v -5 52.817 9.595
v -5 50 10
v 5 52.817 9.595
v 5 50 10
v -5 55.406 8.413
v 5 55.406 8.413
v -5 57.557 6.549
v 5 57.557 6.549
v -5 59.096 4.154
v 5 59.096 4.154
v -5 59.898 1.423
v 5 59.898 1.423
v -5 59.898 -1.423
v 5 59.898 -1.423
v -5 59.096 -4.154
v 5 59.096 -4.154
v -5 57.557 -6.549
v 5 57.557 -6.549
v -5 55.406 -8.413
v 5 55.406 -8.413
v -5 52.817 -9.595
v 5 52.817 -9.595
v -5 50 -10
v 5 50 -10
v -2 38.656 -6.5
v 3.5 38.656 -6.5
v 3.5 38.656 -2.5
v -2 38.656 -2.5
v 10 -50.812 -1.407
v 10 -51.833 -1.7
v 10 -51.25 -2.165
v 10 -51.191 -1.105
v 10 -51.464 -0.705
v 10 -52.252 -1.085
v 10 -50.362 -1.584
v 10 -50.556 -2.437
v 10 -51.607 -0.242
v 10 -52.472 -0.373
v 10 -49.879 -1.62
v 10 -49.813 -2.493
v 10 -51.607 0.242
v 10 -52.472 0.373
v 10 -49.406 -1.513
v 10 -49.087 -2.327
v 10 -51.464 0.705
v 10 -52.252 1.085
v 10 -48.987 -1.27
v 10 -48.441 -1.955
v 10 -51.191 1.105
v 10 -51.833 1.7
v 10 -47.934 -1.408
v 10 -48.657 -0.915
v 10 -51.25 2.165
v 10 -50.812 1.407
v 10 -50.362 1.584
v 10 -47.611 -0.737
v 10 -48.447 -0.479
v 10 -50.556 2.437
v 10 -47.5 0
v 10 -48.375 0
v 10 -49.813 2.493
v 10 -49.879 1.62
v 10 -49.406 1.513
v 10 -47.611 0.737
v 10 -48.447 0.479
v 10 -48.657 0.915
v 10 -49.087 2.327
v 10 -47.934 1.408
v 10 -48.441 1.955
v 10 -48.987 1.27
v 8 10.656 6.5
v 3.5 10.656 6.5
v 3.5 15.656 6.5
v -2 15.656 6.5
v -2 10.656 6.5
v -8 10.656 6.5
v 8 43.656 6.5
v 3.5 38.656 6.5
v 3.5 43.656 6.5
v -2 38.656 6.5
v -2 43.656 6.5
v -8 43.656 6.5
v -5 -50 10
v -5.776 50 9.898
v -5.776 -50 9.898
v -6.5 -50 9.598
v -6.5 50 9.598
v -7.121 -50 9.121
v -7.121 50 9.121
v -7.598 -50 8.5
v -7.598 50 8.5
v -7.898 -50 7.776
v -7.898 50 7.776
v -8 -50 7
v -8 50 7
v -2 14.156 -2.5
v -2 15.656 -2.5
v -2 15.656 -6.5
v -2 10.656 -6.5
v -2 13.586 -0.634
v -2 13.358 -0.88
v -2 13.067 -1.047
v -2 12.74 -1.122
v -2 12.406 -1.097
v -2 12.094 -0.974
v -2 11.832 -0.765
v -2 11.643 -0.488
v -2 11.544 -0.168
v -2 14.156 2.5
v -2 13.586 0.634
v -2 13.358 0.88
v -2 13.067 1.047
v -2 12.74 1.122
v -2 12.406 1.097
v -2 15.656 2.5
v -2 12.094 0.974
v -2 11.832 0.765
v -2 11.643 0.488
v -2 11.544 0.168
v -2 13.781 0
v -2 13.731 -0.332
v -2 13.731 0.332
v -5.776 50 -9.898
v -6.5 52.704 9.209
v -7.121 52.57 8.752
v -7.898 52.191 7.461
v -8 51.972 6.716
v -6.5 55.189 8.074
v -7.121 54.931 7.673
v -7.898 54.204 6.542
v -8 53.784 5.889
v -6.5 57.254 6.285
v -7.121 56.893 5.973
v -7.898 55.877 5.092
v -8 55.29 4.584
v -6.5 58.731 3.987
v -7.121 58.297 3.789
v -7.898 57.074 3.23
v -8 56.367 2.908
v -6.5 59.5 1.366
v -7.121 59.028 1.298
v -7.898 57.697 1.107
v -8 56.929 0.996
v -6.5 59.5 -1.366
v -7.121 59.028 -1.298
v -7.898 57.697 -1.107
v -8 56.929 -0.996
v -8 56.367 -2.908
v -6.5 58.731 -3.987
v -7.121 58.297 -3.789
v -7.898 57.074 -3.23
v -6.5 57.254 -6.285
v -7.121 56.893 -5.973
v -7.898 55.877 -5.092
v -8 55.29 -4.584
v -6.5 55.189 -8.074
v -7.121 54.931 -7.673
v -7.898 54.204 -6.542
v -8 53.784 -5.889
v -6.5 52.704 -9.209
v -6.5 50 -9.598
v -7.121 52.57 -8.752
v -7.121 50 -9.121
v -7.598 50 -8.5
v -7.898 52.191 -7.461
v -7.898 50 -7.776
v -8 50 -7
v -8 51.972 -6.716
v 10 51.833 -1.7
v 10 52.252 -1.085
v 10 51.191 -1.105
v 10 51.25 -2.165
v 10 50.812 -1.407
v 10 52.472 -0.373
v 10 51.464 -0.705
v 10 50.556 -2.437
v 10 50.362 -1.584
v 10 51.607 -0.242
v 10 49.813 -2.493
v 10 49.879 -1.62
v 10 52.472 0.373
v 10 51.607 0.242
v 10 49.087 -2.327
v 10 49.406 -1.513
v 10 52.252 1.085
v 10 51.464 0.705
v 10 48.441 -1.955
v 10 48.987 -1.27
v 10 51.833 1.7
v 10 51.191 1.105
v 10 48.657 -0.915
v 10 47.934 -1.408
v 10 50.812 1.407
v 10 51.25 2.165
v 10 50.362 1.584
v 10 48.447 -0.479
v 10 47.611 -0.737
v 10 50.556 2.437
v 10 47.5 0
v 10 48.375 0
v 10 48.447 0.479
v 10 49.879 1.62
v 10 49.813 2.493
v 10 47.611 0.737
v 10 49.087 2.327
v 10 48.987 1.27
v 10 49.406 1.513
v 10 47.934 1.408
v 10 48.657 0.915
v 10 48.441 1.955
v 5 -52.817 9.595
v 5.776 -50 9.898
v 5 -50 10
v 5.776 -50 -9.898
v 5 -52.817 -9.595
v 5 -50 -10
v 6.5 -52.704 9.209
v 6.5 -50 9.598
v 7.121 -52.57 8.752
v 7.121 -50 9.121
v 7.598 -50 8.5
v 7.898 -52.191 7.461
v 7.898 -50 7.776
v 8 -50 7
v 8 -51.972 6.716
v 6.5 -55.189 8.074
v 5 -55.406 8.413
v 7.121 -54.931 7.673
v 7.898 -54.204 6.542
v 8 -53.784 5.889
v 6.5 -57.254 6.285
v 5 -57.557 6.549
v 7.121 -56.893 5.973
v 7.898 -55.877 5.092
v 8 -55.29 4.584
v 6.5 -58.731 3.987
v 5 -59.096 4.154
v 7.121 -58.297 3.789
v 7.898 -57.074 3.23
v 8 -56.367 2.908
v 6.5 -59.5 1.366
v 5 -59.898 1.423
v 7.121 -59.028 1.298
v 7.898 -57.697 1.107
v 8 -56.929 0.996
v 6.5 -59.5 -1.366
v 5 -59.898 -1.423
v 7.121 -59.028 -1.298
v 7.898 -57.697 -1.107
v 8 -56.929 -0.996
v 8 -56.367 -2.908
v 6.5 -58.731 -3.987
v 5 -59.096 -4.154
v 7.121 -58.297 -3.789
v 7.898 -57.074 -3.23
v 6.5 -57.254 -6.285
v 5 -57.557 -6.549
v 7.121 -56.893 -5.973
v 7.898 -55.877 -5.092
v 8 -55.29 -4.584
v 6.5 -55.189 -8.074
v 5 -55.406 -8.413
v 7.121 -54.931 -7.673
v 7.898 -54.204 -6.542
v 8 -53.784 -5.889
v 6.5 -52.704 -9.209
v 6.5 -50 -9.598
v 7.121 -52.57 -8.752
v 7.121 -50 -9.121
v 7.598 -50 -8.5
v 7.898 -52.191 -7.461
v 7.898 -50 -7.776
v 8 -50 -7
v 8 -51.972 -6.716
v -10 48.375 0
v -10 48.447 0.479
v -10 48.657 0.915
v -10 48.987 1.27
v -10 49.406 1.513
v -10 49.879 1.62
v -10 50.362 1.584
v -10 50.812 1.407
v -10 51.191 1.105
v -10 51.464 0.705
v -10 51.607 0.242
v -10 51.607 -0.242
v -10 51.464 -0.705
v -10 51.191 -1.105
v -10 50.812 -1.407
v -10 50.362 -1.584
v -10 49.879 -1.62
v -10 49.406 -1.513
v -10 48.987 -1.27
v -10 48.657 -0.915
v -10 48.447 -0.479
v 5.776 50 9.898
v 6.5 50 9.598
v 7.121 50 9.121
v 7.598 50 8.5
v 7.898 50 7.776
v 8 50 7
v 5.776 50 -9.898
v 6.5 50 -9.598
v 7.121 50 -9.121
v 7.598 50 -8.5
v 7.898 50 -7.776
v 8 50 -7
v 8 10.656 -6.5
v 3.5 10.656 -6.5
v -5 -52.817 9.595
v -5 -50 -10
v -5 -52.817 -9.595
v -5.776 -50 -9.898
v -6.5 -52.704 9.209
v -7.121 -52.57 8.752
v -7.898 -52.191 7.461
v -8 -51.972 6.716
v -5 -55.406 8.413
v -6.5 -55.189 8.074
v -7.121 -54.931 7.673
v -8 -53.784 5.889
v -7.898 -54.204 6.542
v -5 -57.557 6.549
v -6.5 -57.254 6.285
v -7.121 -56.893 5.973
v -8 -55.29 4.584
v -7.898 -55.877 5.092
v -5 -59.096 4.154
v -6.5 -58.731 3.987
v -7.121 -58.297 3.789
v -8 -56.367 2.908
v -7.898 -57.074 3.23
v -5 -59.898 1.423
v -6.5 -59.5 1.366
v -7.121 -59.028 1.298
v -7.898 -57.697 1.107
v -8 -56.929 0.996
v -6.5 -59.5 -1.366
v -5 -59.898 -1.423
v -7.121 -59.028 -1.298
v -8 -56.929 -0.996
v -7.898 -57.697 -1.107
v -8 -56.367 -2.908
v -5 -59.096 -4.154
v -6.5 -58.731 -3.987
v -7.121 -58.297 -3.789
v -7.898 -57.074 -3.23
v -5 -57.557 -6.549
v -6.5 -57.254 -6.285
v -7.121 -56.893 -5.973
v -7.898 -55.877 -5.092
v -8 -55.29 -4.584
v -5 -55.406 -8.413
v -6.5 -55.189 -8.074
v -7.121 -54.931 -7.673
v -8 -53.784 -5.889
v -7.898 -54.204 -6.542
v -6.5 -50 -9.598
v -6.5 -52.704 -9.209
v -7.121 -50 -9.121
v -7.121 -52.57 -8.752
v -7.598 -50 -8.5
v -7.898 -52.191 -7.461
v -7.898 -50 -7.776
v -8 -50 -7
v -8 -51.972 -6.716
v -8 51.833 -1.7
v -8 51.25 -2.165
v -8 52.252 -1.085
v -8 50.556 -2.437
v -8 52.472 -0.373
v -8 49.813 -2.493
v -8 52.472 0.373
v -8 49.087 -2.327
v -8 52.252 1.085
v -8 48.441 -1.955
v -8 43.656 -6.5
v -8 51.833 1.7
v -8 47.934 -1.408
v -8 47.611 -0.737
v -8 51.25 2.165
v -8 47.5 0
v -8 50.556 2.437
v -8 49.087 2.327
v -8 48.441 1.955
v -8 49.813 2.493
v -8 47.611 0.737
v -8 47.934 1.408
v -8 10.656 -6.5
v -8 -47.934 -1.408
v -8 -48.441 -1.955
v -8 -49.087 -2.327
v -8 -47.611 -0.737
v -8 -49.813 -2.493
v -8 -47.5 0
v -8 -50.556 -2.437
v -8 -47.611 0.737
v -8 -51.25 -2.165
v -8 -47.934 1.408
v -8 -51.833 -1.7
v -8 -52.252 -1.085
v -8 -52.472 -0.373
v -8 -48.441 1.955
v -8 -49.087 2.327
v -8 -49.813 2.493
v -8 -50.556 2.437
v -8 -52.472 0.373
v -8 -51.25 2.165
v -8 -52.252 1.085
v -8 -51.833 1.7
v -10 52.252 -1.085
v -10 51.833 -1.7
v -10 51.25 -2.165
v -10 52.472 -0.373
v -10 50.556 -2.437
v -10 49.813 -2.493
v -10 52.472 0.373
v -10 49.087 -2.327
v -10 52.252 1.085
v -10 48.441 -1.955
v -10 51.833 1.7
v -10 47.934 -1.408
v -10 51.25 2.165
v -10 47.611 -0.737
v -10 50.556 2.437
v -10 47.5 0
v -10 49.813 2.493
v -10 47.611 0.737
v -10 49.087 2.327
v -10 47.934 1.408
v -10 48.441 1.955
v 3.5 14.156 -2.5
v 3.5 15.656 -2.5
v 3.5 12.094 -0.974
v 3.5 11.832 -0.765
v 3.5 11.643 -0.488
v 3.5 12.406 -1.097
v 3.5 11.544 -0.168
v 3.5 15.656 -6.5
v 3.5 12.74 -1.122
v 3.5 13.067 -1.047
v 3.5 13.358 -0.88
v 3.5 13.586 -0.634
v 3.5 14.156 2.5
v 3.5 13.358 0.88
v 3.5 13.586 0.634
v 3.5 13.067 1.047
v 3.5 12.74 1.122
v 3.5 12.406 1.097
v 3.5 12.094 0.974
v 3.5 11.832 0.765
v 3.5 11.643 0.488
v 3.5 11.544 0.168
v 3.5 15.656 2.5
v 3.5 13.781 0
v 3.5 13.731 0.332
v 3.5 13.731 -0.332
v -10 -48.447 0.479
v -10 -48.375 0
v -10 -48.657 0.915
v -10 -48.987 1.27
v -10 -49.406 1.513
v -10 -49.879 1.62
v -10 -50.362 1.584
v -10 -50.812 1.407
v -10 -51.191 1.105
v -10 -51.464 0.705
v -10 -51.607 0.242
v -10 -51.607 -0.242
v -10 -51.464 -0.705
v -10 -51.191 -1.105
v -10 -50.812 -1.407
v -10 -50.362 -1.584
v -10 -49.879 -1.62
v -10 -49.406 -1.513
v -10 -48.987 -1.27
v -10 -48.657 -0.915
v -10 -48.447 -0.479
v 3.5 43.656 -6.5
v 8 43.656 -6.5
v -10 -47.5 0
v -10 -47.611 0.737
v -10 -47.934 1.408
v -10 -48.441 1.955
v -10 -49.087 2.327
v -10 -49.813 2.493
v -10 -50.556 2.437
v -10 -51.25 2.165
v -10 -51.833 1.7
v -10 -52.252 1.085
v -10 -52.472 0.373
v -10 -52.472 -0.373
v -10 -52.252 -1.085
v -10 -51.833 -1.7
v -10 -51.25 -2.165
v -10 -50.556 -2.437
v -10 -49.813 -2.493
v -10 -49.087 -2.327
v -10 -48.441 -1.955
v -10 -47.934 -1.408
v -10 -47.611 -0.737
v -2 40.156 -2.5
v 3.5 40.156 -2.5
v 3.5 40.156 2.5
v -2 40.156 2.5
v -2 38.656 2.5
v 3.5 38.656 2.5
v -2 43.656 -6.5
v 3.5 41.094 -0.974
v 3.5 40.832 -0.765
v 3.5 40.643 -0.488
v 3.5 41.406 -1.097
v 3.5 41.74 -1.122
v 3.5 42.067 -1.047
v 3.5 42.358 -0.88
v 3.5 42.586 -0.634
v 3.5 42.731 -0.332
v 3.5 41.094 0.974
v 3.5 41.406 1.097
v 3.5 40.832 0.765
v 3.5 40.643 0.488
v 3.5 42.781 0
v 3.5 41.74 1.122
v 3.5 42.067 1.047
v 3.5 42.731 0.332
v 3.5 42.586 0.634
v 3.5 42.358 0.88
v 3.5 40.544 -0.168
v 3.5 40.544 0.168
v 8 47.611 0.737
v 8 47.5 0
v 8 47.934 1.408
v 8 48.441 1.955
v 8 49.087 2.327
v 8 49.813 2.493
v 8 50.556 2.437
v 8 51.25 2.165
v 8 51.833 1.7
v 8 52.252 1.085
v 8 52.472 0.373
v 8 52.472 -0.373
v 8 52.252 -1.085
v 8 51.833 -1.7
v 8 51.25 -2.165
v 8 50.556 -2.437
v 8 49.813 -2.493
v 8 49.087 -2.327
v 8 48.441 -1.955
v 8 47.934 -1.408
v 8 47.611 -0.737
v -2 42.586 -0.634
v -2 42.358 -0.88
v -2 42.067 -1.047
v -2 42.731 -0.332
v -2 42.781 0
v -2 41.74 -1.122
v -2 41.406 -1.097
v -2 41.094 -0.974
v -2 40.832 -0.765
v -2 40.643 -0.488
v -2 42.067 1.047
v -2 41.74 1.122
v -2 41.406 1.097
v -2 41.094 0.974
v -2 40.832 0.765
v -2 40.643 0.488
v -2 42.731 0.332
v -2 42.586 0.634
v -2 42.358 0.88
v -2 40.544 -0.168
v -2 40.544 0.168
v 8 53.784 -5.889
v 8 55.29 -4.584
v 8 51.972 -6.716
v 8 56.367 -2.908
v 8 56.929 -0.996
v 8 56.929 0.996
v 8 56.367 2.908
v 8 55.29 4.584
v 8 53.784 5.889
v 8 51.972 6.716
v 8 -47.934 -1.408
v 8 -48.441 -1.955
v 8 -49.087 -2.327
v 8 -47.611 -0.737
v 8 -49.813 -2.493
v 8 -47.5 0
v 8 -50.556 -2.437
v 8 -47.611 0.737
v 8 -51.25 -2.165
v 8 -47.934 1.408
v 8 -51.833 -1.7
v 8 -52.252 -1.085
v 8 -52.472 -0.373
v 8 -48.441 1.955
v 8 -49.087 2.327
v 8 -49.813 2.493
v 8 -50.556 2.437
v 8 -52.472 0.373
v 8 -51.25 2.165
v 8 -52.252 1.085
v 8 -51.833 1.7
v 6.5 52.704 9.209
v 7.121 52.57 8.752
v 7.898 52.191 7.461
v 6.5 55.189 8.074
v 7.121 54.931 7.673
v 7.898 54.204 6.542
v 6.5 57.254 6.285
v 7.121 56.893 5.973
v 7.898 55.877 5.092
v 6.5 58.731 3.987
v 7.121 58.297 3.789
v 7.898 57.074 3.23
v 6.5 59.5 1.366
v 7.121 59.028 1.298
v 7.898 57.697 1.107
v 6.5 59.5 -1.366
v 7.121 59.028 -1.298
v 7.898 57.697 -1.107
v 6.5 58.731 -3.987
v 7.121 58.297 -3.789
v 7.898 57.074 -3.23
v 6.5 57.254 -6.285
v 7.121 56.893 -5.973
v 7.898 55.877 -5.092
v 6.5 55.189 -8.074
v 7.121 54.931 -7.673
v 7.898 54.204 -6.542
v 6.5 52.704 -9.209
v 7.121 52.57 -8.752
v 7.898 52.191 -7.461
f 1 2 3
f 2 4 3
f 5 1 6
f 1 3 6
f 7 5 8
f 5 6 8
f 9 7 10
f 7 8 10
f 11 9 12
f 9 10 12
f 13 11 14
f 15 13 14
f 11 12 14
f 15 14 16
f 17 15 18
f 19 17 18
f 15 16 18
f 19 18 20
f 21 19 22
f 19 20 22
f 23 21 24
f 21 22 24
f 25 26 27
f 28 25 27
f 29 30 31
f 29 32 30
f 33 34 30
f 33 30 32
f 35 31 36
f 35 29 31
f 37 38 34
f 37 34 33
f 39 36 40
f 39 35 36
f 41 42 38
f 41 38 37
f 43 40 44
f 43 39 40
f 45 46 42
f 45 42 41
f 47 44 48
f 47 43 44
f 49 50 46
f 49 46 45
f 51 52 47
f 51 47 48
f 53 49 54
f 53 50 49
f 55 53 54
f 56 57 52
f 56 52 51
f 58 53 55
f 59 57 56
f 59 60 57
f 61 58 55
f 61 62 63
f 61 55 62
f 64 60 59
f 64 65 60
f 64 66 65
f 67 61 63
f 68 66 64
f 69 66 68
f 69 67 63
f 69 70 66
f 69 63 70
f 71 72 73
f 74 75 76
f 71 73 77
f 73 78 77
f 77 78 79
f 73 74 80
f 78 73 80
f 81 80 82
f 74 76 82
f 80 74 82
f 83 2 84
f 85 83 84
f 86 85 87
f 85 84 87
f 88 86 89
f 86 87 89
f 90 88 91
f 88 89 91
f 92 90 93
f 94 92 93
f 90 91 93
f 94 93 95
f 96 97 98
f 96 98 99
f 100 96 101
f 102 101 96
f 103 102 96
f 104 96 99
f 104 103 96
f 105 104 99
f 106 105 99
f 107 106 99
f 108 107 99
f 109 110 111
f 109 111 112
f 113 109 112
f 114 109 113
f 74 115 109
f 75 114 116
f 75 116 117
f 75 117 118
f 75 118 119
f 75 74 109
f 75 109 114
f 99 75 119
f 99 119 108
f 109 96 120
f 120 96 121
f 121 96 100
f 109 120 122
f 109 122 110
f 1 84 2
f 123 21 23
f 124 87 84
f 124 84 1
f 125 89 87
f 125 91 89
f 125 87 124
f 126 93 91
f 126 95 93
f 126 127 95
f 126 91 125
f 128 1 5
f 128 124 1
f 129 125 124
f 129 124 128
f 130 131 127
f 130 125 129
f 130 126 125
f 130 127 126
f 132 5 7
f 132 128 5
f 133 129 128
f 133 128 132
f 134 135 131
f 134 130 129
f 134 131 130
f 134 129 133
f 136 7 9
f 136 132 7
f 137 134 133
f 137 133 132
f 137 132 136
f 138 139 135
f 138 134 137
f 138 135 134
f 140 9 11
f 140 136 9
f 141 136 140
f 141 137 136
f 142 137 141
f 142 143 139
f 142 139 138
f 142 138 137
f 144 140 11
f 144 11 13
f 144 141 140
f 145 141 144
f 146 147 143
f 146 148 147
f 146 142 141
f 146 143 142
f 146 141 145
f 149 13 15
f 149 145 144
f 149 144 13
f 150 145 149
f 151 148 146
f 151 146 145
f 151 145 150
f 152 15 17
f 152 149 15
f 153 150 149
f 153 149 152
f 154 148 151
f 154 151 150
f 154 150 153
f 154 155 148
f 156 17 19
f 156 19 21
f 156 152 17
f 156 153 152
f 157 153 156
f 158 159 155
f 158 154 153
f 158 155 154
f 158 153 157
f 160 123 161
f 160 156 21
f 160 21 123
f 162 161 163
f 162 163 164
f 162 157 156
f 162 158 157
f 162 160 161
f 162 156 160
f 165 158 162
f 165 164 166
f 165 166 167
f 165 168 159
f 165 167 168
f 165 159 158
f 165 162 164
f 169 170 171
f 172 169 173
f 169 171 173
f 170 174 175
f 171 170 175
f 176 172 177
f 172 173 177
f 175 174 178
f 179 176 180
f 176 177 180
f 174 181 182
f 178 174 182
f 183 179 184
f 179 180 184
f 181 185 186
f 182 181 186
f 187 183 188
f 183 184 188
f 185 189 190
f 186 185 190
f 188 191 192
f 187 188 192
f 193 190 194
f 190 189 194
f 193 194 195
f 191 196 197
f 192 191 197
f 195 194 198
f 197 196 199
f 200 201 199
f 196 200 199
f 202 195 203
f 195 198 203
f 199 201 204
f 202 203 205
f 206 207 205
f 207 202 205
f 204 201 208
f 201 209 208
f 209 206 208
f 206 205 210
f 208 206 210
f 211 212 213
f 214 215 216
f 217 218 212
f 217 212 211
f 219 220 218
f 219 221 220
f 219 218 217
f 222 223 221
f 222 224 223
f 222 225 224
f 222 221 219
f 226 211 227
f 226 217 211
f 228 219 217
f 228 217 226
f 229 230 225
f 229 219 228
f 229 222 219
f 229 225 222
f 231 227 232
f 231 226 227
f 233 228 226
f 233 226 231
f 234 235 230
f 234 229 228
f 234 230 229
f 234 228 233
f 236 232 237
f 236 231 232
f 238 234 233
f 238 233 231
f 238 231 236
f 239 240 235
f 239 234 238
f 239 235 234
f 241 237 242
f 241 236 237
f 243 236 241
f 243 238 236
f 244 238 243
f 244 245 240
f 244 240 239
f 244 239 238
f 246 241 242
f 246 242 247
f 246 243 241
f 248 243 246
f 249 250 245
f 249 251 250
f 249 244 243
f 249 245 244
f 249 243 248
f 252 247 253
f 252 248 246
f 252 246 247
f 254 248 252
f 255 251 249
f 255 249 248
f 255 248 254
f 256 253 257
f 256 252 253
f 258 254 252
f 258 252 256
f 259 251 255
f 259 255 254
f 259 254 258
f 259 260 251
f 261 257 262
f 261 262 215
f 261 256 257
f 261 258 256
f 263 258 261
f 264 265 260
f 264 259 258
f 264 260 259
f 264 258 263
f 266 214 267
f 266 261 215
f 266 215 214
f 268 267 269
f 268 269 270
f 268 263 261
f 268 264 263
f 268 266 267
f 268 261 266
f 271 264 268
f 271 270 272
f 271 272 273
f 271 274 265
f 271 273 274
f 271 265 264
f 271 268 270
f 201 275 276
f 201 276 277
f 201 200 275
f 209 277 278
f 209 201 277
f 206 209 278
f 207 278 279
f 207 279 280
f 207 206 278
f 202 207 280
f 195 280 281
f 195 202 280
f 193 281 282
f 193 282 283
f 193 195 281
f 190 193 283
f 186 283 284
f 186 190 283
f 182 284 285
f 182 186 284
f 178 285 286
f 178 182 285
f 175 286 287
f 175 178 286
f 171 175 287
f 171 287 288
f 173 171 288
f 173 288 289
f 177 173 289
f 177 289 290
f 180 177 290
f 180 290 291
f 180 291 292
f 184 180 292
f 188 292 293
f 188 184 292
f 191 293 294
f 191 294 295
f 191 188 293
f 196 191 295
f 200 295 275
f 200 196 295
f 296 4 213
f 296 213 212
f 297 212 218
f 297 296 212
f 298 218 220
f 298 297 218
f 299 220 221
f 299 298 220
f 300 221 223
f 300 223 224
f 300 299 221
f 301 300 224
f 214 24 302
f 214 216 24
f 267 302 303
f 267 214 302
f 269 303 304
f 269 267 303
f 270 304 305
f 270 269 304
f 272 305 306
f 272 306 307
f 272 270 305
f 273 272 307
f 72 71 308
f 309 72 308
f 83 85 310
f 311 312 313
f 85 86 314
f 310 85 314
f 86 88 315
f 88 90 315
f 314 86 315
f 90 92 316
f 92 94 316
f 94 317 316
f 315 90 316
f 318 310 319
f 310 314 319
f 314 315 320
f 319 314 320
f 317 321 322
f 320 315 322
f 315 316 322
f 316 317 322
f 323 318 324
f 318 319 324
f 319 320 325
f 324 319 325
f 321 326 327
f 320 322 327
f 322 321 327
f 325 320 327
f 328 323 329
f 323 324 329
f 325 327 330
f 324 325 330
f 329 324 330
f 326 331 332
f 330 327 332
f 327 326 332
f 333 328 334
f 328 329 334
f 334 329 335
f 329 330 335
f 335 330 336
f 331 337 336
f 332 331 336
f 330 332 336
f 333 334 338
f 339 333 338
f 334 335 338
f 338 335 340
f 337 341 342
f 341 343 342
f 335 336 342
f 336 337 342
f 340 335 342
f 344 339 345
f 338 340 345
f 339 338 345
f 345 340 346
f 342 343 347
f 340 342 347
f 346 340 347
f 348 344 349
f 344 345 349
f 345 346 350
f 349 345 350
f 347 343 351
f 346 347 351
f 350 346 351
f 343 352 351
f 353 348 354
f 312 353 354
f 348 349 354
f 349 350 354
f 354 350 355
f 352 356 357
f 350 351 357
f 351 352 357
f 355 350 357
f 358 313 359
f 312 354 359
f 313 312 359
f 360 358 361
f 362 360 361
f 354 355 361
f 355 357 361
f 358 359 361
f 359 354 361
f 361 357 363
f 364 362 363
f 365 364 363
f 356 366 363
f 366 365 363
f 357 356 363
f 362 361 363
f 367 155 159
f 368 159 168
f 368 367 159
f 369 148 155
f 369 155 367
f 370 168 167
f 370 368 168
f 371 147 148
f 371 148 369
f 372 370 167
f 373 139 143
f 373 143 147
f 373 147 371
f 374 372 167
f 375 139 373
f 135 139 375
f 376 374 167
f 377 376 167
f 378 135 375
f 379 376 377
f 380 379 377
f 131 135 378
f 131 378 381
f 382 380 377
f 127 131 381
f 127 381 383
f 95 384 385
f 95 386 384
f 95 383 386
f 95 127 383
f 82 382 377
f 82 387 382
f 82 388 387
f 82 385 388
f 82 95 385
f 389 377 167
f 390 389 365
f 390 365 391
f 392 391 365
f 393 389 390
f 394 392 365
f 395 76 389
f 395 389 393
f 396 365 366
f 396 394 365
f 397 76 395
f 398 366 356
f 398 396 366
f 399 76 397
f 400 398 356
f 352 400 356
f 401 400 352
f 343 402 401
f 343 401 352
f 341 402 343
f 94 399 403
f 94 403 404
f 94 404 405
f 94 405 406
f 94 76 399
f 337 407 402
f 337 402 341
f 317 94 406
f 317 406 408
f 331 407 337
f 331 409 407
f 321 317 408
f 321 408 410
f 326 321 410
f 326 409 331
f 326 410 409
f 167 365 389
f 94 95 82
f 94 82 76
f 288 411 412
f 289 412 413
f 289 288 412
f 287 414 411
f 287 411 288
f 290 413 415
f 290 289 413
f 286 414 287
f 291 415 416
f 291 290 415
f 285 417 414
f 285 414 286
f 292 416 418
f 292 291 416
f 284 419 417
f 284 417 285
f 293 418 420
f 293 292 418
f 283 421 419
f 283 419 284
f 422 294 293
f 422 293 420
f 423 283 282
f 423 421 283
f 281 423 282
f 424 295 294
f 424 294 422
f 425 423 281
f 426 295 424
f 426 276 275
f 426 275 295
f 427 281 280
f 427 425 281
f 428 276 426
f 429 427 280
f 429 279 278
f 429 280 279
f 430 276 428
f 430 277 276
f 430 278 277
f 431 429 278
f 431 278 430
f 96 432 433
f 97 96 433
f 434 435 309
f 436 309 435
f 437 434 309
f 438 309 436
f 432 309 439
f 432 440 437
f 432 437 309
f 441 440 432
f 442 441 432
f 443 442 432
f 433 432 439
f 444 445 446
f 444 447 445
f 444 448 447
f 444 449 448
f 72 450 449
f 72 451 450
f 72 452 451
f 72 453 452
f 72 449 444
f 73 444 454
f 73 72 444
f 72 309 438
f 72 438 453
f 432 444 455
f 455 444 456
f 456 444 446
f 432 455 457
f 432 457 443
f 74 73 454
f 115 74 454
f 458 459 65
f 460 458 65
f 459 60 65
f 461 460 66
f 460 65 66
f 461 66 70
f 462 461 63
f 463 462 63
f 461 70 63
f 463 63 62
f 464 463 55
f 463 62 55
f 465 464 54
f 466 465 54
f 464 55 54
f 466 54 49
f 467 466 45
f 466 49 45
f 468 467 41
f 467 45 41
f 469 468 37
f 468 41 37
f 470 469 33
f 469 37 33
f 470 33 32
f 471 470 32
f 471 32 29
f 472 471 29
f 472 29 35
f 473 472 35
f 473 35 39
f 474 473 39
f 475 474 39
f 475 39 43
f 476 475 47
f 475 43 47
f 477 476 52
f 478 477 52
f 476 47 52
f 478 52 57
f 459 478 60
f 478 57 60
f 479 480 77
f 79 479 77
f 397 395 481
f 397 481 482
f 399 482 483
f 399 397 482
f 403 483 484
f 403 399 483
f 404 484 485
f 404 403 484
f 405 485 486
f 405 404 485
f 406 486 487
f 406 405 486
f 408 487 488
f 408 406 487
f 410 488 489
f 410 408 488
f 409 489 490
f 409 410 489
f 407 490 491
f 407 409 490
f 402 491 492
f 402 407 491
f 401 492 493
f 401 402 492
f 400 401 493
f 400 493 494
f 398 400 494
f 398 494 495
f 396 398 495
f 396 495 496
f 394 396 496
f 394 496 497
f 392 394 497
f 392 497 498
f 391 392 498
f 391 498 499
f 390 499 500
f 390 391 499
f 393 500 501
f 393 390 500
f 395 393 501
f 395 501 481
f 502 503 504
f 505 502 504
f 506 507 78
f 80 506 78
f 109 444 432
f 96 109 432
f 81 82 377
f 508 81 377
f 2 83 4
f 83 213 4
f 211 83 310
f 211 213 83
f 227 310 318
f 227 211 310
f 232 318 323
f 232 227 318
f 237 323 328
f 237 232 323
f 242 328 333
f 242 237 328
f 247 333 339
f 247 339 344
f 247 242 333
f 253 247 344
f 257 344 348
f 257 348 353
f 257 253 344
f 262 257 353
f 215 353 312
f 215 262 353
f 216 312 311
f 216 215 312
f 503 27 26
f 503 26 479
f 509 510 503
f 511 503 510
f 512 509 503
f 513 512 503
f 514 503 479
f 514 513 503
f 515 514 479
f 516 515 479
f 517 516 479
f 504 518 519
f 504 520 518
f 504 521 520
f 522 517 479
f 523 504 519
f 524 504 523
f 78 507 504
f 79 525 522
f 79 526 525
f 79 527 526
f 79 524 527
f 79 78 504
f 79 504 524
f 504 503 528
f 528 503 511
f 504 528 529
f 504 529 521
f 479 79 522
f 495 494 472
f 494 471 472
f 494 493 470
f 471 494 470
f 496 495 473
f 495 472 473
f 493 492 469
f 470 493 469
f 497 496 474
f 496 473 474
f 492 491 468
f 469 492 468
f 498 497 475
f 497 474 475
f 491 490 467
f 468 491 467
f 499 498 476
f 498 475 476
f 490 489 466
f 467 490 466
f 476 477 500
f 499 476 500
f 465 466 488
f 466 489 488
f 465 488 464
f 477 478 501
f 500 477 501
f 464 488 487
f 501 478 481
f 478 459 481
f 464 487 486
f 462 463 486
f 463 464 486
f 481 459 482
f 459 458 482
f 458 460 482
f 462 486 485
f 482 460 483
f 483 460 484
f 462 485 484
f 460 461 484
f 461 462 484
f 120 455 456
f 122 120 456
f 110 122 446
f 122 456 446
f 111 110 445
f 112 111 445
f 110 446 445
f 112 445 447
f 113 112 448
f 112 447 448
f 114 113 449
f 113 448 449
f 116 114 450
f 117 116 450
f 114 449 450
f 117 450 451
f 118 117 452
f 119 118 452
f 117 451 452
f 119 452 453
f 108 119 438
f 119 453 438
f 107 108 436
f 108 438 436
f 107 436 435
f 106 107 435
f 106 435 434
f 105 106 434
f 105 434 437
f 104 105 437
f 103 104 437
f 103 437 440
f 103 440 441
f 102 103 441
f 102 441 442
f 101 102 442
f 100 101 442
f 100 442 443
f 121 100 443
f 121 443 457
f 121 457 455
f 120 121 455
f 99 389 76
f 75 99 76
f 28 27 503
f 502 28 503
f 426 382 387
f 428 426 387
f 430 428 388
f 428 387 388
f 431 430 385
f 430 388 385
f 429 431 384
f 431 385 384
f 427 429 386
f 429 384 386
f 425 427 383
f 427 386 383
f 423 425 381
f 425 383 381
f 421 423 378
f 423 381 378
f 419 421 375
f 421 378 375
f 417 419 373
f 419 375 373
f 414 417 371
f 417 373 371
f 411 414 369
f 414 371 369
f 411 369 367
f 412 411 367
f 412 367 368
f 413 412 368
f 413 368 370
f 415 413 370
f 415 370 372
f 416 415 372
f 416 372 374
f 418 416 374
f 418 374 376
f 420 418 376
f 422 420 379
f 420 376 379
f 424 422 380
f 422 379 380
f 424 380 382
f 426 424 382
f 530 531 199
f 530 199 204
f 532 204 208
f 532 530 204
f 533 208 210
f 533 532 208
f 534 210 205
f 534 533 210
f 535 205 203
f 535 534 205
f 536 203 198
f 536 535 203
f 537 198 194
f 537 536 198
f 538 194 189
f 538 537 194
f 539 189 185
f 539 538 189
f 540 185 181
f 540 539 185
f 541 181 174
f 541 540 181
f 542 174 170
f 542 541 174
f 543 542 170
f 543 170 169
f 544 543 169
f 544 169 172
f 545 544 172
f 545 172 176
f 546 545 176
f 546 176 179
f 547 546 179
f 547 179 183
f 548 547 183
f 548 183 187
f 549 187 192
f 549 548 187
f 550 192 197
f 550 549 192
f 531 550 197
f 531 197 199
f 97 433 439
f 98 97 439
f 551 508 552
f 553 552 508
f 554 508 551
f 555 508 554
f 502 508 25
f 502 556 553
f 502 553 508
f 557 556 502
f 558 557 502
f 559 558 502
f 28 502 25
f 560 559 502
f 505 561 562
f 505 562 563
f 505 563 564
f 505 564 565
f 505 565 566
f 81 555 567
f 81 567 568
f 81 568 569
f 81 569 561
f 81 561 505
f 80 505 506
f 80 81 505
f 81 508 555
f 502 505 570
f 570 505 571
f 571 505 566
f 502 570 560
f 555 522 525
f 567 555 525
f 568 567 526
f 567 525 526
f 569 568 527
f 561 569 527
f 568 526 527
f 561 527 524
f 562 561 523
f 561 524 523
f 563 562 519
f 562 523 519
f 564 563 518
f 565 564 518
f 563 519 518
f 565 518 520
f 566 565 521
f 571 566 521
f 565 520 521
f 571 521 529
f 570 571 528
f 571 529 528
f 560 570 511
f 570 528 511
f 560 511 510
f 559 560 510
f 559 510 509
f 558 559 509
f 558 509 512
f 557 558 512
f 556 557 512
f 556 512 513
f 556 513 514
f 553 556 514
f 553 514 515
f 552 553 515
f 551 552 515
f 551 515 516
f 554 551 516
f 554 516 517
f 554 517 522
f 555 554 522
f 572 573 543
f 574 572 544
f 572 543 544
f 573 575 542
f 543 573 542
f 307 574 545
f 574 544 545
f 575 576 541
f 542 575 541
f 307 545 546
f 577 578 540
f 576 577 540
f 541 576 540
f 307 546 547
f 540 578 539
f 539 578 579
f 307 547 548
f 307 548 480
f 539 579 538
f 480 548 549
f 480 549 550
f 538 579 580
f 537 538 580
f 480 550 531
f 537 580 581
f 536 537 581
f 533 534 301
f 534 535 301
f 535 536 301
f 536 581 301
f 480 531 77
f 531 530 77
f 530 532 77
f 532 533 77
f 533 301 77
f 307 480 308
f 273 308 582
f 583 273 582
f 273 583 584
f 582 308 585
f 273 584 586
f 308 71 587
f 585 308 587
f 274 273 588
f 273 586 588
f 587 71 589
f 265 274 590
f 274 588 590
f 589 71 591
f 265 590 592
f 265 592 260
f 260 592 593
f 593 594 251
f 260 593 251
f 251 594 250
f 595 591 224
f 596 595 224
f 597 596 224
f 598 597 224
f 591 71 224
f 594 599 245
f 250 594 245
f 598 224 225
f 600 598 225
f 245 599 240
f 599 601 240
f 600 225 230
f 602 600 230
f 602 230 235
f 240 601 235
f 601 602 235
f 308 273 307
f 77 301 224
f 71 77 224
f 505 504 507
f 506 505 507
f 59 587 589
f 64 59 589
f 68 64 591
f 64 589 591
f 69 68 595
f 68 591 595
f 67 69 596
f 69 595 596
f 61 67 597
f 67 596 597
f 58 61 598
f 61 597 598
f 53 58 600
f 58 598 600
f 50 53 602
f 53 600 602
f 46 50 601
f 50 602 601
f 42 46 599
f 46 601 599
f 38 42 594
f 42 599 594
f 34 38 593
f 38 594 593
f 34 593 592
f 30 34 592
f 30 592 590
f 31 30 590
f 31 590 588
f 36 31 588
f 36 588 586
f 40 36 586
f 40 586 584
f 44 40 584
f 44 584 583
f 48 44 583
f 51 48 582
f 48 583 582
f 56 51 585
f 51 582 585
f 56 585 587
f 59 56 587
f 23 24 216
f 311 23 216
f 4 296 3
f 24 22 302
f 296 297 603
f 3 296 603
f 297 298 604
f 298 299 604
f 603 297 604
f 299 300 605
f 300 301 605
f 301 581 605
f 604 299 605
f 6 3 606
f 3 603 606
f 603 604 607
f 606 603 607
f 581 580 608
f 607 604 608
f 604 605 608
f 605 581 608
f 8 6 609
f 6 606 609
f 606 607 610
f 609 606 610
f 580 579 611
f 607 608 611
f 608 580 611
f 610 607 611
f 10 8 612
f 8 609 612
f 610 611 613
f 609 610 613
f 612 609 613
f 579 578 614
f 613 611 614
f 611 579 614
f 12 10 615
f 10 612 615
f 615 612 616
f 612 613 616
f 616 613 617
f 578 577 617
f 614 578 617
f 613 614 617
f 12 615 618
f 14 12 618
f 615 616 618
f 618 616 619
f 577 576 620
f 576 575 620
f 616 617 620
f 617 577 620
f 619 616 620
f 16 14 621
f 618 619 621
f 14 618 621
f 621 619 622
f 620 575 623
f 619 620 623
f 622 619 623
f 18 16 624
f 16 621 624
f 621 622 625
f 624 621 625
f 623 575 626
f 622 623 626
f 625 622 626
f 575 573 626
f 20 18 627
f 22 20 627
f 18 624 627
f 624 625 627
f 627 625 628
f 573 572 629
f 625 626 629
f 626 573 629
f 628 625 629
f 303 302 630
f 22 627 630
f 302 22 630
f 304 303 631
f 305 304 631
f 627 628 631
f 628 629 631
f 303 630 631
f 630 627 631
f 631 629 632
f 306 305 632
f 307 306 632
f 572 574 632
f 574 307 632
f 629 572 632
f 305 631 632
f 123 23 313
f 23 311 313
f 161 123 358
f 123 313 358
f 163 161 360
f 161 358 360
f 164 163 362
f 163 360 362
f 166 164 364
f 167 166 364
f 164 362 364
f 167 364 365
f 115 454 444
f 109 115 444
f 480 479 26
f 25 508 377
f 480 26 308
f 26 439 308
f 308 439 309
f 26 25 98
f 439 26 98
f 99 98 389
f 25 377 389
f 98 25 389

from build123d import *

# Parameters (mm, degrees)
F0_R      = 1.625
F1_DEPTH  = 8
F2_R      = 2.5
F2_R_2    = 1.625
F3_DEPTH  = 2
F4_R      = 3
F7_R      = 1.125
F8_DEPTH  = 16
F9_R      = 1.125
F10_DEPTH = 4.5
F11_R     = 1.125
F12_DEPTH = 6


with BuildPart() as f1:
    # F0 (on Right) → F1 (new body)
    with BuildSketch(Plane.YZ):
        with BuildLine():
            Line((0, -10), (0, 10))
            Line((0, 10), (-50, 10))
            ThreePointArc((-50, 10), (-60, 0), (-50, -10))
            Line((-50, -10), (0, -10))
        make_face()
        with Locations((-50, 0)):
            Circle(F0_R, mode=Mode.SUBTRACT)
    extrude(amount=F1_DEPTH)

    # F2 (on face) → F3 (join)
    with BuildSketch(Plane.YZ.offset(8)):
        with Locations((-50, 0)):
            Circle(F2_R)
        with Locations((-50, 0)):
            Circle(F2_R_2, mode=Mode.SUBTRACT)
    extrude(amount=F3_DEPTH)

    # F4
    f4_edges = [f1.edges().sort_by_distance(p)[0] for p in [
        (8, -25, 10),
    ]]
    fillet(f4_edges, radius=F4_R)

    # F5: F1 across plane


with BuildPart() as f1_1:
    add(f1.part)
    add(f1.part.mirror(Plane.YZ))

    # F6: F1 across plane


with BuildPart() as f1_2:
    add(f1_1.part)
    add(f1_1.part.mirror(Plane.XZ))

    # F7 (on face) → F8 (cut, through all)
    with BuildSketch(Plane.YZ.offset(8)):
        Polygon((15.6563942954, -6.5), (38.6563942954, -6.5), (38.6563942954, -2.5), (40.1563942954, -2.5), (40.1563942954, 2.5), (38.6563942954, 2.5), (38.6563942954, 6.5), (15.6563942954, 6.5), (15.6563942954, 2.5), (14.1563942954, 2.5), (14.1563942954, -2.5), (15.6563942954, -2.5), align=None)
        with Locations((12.6563942954, 0)):
            Circle(F7_R)
        with Locations((41.6563942954, 0)):
            Circle(F7_R)
    extrude(amount=-F8_DEPTH, mode=Mode.SUBTRACT)

    # F9 (on face) → F10 (cut)
    with BuildSketch(Plane.YZ.offset(8)):
        Polygon((15.6563942954, 6.5), (10.6563942954, 6.5), (10.6563942954, -6.5), (15.6563942954, -6.5), (15.6563942954, -2.5), (14.1563942954, -2.5), (14.1563942954, 2.5), (15.6563942954, 2.5), align=None)
        with Locations((12.6563942954, 0)):
            Circle(F9_R, mode=Mode.SUBTRACT)
        Polygon((43.6563942954, 6.5), (38.6563942954, 6.5), (38.6563942954, 2.5), (40.1563942954, 2.5), (40.1563942954, -2.5), (38.6563942954, -2.5), (38.6563942954, -6.5), (43.6563942954, -6.5), align=None)
        with Locations((41.6563942954, 0)):
            Circle(F9_R, mode=Mode.SUBTRACT)
    extrude(amount=-F10_DEPTH, mode=Mode.SUBTRACT)

    # F11 (on face) → F12 (cut)
    with BuildSketch(Plane(origin=(-8, 0, 0), x_dir=(0, -1, 0), z_dir=(-1, 0, 0))):
        Polygon((-43.6563942954, 6.5), (-43.6563942954, -6.5), (-38.6563942954, -6.5), (-38.6563942954, -2.5), (-40.1563942954, -2.5), (-40.1563942954, 2.5), (-38.6563942954, 2.5), (-38.6563942954, 6.5), align=None)
        with Locations((-41.6563942954, 0)):
            Circle(F11_R, mode=Mode.SUBTRACT)
        Polygon((-15.6563942954, -2.5), (-15.6563942954, -6.5), (-10.6563942954, -6.5), (-10.6563942954, 6.5), (-15.6563942954, 6.5), (-15.6563942954, 2.5), (-14.1563942954, 2.5), (-14.1563942954, -2.5), align=None)
        with Locations((-12.6563942954, 0)):
            Circle(F11_R, mode=Mode.SUBTRACT)
    extrude(amount=-F12_DEPTH, mode=Mode.SUBTRACT)


solid = f1_2.part
